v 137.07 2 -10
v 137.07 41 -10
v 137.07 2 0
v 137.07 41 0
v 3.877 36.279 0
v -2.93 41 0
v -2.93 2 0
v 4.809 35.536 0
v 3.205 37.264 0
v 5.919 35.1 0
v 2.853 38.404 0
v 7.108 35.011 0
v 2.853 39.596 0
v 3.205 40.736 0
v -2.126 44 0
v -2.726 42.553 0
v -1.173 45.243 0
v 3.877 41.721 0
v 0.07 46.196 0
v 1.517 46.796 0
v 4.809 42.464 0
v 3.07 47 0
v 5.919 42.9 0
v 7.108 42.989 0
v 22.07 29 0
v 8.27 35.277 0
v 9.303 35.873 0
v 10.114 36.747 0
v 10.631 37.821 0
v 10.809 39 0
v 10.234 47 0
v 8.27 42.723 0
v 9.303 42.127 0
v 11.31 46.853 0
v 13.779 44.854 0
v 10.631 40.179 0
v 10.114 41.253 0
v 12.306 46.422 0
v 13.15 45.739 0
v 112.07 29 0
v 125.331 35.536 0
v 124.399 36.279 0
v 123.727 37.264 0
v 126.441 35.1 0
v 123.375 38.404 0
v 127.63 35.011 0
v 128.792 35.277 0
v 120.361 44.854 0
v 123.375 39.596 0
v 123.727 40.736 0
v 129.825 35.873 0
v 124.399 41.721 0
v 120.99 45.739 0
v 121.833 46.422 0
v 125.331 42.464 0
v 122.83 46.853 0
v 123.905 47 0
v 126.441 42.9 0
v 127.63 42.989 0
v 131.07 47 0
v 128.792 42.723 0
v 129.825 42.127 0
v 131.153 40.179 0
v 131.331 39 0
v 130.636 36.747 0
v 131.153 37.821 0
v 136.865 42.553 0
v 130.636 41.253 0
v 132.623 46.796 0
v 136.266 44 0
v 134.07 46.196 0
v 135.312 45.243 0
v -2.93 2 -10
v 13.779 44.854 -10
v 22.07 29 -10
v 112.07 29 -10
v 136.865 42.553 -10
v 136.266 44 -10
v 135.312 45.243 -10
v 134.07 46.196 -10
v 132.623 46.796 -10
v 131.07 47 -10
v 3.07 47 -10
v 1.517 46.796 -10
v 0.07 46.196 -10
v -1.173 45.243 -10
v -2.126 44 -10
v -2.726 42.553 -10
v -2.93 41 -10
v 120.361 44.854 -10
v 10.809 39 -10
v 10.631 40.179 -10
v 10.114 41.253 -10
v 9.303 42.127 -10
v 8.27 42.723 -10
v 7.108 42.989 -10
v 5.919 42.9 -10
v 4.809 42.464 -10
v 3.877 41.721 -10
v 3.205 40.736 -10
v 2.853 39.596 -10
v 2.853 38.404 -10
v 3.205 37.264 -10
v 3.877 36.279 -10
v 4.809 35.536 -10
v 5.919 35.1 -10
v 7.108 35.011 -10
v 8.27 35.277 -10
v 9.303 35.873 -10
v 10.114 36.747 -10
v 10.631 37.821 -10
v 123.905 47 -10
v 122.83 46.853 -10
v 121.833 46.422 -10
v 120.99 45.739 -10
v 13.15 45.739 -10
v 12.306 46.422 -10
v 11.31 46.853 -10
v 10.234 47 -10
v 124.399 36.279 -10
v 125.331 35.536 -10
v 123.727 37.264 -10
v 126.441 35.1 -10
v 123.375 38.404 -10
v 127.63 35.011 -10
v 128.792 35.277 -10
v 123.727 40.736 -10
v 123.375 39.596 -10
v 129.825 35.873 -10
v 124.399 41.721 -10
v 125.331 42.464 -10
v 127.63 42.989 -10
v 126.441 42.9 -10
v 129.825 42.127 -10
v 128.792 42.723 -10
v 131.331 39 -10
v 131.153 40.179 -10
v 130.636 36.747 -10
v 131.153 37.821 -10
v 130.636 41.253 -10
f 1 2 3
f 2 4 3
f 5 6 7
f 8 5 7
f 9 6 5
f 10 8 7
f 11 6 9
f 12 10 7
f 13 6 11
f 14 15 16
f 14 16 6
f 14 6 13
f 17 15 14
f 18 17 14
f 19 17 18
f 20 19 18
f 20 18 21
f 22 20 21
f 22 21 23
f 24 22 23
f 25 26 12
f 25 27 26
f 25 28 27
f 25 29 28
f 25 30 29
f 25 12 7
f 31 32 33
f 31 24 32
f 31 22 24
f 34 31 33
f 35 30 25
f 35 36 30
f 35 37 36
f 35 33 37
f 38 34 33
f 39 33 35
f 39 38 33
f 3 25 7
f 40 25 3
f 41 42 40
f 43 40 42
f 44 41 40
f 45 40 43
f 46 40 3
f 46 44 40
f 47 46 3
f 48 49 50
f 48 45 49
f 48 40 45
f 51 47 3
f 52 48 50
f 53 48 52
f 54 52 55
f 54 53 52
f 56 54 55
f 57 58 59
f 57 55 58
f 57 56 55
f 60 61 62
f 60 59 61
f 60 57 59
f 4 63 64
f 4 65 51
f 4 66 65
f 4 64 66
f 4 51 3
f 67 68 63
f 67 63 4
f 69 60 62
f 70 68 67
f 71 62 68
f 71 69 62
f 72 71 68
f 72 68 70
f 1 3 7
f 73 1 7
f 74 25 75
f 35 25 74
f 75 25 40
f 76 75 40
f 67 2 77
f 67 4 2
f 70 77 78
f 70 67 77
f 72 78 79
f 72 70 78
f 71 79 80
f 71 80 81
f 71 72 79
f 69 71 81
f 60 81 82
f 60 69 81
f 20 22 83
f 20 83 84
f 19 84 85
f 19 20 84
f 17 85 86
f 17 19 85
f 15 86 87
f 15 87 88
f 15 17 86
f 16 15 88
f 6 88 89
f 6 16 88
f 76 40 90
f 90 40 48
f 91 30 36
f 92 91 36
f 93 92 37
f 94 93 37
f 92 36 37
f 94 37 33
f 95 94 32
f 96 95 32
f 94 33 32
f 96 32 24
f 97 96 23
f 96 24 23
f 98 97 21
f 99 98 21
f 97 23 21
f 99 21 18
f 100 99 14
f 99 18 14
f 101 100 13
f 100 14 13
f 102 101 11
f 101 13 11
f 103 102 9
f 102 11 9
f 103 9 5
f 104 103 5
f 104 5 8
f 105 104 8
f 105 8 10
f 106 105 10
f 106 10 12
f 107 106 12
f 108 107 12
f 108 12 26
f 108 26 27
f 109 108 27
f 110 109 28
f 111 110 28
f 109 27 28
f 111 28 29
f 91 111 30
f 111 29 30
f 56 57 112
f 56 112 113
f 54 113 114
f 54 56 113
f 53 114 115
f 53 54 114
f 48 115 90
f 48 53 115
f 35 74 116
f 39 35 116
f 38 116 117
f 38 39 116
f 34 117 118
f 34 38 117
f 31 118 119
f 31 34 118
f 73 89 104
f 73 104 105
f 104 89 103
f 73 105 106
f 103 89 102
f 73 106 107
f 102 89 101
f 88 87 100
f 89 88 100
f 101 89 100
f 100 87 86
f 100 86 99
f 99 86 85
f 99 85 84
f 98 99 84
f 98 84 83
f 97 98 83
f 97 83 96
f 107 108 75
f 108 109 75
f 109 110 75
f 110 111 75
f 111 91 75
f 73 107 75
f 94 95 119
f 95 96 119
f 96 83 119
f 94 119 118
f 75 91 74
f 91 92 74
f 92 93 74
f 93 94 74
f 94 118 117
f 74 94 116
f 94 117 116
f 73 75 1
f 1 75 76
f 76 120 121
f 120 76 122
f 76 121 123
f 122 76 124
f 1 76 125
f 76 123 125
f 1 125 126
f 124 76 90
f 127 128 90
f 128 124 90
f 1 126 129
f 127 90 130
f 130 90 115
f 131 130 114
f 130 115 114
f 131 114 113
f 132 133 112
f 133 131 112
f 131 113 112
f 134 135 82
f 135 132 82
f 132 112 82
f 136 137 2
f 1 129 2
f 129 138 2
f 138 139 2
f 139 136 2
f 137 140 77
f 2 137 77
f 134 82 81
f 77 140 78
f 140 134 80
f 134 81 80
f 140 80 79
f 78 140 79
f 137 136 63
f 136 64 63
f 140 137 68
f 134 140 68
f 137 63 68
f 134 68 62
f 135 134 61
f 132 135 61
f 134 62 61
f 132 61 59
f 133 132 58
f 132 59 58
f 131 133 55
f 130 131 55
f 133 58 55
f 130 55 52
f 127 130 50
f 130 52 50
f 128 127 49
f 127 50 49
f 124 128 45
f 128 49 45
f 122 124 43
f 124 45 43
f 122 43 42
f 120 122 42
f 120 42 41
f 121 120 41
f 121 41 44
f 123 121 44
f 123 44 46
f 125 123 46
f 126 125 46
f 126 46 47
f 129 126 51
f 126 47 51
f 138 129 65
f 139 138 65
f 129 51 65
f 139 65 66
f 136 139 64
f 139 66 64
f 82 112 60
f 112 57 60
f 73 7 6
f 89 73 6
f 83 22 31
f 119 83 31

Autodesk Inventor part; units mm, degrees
ref_plane "YZ Plane" through (0, 0, 0) normal (1, 0, 0) x (0, 1, 0)
ref_plane "XZ Plane" through (0, 0, 0) normal (0, 1, 0) x (-1, 0, 0)
ref_plane "XY Plane" through (0, 0, 0) normal (0, 0, 1) x (1, 0, 0)
ref_plane "Work Plane1" through (0, 0, 0) normal (0, 0, 1) x (1, 0, 0)
sketch "Sketch1" plane through (0, 0, 0) normal (0, 0, 1) x (1, 0, 0)
  point P0 (0, 0)
ref_plane "Work Plane2" through (0, 0, 0) normal (0, 0, 1) x (1, 0, 0)
sketch "Sketch2" plane through (0, 0, 0) normal (0, 0, 1) x (1, 0, 0)
  line L0 (133.9999, 0) -> (0, 0) construction
  line L1 (133.9999, 0) -> (133.9999, 2) construction
  line L2 (0, 2) -> (133.9999, 2) construction
  line L3 (0, 0) -> (0, 2) construction
  line L4 (137.0698, 41) -> (137.0698, 2)
  line L5 (137.0698, 2) -> (-2.9302, 2)
  line L6 (-2.9302, 2) -> (-2.9302, 41)
  line L7 (-2.9302, 47) -> (137.0698, 2) construction
  line L8 (137.0698, 47) -> (-2.9302, 2) construction
  line L9 (22.0698, 29) -> (112.0698, 29)
  line L10 (22.0698, 29) -> (13.7788, 44.8537)
  line L11 (67.0698, 29) -> (67.0698, 47) construction
  line L12 (112.0698, 29) -> (120.3608, 44.8537)
  line L13 (3.0698, 47) -> (10.2342, 47)
  line L14 (123.9053, 47) -> (131.0698, 47)
  arc A0 (13.7788, 44.8537) -> (10.2342, 47) centre (10.2342, 43) ccw
  arc A1 (123.9053, 47) -> (120.3608, 44.8537) centre (123.9053, 43) ccw
  arc A2 (3.0698, 47) -> (-2.9302, 41) centre (3.0698, 41) ccw
  arc A3 (137.0698, 41) -> (131.0698, 47) centre (131.0698, 41) ccw
  circle A4 centre (6.8088, 39) radius 4
  circle A5 centre (127.3308, 39) radius 4
  point P0 (67.0698, 24.5)
  point P1 (12.6563, 47)
  point P2 (121.4832, 47)
  dimension "d0" = 140
  dimension "d1" = 45
  dimension "d6" = 25
  dimension "d7" = 25
  dimension "d8" = 4
  dimension "d9" = 6
  dimension "d10" = 45
  dimension "d11" = 8
  dimension "d12" = 8
  dimension "d16" = 120.522
extrude "Extrusion1" add sketch "Sketch2" against normal blind 10
properties part number "supporto_guide_lungo"
